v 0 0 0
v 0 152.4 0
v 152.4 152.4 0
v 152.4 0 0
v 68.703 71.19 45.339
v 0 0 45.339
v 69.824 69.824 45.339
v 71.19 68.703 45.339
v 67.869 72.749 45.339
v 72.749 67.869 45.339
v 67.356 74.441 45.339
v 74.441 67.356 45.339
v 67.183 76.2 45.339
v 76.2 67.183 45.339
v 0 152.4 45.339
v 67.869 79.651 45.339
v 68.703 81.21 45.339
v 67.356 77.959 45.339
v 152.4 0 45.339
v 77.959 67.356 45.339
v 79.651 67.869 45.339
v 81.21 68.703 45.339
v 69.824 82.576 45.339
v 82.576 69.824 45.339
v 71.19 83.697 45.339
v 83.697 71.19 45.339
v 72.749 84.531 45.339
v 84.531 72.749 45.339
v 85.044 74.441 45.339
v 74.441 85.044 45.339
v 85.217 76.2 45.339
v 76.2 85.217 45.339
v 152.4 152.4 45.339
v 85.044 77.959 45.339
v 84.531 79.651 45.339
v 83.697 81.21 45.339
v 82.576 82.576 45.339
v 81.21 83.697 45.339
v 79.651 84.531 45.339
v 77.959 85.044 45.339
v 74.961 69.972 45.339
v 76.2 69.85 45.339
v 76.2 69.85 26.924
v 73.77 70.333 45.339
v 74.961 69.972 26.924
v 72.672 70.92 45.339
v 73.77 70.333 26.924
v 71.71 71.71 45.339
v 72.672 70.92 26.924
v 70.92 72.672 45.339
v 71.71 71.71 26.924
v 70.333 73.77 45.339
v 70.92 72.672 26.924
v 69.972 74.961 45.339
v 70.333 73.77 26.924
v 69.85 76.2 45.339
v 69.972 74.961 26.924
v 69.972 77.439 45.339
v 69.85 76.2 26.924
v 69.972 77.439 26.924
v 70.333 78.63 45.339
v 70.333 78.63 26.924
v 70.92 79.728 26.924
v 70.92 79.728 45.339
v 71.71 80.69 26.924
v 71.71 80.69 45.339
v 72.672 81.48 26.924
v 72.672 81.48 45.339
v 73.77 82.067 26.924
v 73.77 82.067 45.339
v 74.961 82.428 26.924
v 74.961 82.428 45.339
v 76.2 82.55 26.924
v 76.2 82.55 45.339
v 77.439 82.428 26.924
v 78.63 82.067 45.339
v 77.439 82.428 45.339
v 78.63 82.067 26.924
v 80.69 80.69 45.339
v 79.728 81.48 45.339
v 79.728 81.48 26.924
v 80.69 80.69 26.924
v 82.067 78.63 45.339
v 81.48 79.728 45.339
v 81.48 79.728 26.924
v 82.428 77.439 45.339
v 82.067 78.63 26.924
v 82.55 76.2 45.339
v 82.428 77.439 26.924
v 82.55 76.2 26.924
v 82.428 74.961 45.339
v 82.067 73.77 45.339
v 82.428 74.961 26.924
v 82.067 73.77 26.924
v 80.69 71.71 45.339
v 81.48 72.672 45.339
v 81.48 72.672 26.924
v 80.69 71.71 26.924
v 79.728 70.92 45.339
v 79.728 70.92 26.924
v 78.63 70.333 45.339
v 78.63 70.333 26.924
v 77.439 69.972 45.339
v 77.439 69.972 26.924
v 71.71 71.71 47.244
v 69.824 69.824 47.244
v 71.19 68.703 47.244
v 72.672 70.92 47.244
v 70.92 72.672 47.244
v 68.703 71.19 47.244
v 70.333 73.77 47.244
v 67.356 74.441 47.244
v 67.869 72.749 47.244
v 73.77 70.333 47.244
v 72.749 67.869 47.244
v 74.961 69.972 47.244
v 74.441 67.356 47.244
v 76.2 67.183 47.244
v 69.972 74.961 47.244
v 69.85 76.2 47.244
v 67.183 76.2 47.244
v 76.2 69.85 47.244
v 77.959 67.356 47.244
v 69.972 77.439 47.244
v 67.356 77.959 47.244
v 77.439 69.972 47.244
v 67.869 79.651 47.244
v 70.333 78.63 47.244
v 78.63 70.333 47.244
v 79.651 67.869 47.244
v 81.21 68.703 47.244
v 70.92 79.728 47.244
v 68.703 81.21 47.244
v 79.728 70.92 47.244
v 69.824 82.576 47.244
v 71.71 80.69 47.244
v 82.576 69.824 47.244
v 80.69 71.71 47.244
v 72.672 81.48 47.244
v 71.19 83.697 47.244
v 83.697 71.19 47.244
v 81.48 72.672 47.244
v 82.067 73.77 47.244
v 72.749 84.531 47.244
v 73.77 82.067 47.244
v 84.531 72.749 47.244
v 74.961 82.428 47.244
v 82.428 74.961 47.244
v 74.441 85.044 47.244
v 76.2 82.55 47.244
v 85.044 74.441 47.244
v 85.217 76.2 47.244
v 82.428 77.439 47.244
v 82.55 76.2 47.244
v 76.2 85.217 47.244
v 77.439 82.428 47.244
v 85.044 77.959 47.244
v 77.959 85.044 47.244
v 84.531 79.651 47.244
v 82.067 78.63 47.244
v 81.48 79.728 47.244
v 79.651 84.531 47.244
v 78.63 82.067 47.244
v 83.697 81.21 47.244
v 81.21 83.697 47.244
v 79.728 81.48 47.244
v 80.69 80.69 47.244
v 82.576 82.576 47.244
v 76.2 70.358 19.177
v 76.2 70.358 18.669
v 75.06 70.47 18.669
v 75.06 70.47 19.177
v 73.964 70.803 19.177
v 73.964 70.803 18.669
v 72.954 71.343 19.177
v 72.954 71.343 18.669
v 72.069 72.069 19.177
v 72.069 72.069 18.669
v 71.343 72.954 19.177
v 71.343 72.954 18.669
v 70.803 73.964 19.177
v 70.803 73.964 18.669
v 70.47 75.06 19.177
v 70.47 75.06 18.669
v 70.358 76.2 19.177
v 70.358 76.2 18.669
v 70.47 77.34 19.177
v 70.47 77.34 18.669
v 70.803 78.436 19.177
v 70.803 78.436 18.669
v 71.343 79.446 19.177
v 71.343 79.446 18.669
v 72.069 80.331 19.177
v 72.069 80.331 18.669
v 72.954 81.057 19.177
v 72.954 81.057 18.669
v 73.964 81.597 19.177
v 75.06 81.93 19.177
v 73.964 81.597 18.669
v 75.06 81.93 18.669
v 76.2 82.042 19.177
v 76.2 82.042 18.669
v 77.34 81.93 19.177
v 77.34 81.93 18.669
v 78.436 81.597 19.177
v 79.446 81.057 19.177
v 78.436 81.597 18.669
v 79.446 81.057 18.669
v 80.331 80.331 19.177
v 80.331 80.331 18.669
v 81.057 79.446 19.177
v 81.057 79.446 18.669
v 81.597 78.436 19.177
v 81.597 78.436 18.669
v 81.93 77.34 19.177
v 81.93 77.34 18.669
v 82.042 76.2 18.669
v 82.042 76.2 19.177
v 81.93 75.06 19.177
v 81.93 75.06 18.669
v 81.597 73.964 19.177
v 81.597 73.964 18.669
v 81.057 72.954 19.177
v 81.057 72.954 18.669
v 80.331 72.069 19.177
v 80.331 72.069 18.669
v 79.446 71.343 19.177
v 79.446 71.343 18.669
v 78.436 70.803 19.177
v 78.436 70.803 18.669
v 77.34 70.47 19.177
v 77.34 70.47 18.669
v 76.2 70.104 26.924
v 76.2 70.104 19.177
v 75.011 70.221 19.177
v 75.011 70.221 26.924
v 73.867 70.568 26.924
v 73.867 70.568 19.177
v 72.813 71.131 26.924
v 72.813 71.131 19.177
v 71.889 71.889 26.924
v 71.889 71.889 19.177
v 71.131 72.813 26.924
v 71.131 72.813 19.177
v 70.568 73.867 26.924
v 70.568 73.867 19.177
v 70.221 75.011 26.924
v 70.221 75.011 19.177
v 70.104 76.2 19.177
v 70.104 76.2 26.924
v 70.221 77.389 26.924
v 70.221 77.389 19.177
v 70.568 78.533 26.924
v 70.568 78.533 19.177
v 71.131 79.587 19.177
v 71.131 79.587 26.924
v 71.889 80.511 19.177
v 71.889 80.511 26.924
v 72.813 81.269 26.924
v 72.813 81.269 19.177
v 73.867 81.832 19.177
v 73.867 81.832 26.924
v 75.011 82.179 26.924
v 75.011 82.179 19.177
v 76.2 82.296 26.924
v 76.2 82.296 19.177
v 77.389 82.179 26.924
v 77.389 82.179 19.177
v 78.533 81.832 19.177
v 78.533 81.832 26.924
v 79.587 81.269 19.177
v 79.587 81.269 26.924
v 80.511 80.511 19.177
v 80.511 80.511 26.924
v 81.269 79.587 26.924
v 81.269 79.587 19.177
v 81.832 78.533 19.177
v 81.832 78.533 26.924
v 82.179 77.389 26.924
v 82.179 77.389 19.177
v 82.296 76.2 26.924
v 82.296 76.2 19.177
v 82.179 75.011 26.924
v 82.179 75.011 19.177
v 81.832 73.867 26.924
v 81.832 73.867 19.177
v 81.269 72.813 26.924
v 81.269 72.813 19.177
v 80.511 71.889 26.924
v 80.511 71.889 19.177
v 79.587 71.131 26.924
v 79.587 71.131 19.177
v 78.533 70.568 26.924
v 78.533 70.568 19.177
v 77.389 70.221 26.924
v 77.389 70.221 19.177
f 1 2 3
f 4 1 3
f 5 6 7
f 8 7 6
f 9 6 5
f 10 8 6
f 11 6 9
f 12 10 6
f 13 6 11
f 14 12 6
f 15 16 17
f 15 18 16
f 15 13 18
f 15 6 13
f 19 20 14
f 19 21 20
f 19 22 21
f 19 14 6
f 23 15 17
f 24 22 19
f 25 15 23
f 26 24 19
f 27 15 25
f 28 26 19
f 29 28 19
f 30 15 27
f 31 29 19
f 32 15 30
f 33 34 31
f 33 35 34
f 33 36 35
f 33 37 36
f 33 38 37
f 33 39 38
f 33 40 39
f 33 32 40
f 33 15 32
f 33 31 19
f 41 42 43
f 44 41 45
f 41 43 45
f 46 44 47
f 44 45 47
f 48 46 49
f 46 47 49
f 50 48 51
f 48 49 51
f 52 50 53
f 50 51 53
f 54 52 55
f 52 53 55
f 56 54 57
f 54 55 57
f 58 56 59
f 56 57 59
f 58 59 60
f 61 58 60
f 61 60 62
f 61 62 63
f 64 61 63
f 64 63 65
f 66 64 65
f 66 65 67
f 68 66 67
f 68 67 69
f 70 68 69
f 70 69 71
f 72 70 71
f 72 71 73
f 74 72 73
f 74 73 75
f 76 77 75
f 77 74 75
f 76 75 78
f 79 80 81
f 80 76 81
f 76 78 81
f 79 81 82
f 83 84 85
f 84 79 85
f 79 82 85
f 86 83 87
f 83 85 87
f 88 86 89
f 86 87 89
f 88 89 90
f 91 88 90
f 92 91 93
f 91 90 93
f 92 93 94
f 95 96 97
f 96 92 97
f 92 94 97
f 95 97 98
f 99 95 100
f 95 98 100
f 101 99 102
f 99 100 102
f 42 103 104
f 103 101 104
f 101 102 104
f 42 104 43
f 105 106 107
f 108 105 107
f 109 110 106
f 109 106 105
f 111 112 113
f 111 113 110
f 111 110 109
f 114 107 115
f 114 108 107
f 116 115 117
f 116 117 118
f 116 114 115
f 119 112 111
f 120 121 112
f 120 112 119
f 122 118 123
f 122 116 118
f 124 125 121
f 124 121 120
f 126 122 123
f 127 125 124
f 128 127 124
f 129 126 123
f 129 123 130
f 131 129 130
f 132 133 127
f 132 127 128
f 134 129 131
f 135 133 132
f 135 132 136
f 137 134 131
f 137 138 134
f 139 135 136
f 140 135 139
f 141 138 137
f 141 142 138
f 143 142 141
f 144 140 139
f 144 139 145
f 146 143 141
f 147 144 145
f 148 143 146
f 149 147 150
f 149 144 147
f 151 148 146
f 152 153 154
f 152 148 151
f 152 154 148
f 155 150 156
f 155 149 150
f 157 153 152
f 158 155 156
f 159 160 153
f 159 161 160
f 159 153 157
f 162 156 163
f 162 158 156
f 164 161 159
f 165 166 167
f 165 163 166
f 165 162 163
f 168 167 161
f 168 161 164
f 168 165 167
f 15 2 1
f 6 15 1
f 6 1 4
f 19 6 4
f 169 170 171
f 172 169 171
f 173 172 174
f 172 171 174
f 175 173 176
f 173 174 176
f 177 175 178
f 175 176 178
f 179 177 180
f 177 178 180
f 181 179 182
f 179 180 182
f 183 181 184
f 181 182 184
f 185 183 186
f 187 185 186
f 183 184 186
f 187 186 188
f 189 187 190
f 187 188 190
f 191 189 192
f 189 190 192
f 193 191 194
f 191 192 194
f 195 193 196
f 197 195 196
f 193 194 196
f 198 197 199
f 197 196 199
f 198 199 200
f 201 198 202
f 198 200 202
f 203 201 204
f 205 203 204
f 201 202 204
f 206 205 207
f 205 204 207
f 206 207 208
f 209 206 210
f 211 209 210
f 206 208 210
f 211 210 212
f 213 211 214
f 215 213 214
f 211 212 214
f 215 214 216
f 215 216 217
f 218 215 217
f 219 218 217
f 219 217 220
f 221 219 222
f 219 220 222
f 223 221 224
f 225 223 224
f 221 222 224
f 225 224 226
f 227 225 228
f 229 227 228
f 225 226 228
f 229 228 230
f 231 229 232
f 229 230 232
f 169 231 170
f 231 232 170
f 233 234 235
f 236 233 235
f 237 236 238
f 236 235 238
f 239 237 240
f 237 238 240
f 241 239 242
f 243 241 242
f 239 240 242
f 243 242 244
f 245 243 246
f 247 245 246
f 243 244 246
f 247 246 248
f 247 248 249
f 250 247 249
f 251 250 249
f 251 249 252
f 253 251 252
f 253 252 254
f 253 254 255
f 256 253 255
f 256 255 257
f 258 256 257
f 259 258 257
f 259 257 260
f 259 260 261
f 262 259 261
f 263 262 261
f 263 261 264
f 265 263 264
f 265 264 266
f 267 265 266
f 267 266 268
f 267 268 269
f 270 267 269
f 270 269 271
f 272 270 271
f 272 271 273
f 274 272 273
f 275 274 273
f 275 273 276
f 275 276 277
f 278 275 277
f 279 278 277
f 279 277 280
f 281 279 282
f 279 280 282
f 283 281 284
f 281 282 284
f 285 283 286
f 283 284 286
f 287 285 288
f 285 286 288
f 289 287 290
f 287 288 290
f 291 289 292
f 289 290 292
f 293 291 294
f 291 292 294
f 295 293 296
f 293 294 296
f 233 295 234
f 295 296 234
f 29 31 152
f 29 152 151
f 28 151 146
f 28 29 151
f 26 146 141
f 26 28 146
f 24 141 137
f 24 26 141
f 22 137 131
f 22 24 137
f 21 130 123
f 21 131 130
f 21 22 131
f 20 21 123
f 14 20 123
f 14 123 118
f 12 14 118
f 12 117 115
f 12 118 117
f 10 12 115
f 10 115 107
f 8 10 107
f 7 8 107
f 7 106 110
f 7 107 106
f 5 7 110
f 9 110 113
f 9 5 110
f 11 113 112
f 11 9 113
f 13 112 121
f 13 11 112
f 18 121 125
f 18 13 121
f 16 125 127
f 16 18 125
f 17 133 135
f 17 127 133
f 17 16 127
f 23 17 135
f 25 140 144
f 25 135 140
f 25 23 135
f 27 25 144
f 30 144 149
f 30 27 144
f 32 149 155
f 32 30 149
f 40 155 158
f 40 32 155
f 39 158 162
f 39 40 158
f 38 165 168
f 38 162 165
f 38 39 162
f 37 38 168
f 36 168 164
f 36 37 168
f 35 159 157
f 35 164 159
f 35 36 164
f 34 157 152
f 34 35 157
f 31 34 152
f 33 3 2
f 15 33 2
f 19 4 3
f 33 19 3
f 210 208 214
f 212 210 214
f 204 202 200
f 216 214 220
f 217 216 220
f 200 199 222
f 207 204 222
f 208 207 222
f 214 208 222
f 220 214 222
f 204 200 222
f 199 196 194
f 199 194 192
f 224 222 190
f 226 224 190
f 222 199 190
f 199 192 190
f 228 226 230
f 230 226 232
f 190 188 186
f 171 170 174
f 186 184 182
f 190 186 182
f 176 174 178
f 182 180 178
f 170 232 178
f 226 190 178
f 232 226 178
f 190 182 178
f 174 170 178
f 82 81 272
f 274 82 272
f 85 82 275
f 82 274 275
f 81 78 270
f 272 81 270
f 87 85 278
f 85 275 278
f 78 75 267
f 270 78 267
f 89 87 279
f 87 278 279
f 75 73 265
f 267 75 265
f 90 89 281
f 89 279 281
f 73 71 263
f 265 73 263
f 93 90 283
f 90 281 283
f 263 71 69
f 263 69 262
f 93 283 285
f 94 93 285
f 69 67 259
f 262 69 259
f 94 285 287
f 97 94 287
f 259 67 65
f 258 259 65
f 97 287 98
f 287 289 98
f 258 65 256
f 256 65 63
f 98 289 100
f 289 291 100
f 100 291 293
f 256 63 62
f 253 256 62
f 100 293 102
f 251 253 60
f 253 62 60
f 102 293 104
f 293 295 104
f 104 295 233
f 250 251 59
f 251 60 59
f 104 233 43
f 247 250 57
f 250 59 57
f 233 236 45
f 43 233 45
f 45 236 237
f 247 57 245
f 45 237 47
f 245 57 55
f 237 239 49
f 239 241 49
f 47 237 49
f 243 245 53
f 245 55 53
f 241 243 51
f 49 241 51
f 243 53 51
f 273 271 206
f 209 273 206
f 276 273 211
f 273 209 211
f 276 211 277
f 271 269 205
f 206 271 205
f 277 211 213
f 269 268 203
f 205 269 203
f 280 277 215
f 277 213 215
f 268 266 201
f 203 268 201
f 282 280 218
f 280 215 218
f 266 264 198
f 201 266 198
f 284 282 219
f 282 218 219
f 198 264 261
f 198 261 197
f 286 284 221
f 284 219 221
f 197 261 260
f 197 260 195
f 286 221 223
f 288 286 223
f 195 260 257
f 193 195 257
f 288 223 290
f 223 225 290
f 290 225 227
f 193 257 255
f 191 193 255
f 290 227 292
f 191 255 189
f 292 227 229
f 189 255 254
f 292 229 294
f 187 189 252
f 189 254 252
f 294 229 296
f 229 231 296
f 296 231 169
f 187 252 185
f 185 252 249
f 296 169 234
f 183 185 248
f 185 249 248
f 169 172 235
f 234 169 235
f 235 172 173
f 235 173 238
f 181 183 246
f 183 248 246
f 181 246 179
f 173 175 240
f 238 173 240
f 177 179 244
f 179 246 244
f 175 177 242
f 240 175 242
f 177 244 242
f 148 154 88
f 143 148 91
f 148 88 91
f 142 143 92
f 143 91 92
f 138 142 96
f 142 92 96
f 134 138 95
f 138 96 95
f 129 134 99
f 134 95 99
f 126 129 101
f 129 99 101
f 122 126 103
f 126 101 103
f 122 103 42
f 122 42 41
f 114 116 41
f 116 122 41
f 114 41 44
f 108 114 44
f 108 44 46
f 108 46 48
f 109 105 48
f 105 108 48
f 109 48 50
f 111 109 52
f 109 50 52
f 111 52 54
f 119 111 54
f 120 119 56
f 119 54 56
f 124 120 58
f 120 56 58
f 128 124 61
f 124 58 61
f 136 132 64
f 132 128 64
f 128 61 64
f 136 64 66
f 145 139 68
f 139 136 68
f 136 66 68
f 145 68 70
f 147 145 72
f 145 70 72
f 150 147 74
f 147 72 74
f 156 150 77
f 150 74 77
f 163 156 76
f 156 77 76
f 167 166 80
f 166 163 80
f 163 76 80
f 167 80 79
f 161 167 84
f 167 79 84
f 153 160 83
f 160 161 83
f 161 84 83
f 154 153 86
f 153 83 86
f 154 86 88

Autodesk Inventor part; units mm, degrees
ref_plane "YZ Plane" through (0, 0, 0) normal (1, 0, 0) x (0, 1, 0)
ref_plane "XZ Plane" through (0, 0, 0) normal (0, 1, 0) x (-1, 0, 0)
ref_plane "XY Plane" through (0, 0, 0) normal (0, 0, 1) x (1, 0, 0)
sketch "Sketch1" plane through (0, 0, 0) normal (0, 0, 1) x (1, 0, 0)
  line L0 (0, 0) -> (152.4, 0)
  line L1 (152.4, 0) -> (152.4, 152.4)
  line L2 (152.4, 152.4) -> (0, 152.4)
  line L3 (0, 152.4) -> (0, 0)
  dimension "d0" = 152.4
  dimension "d1" = 152.4
extrude "Extrusion1" add sketch "Sketch1" along normal blind 45.339
sketch "Sketch2" plane through (0, 0, 45.339) normal (0, 0, 1) x (1, 0, 0)
  line L0 (0, 0) -> (152.4, 0) projected
  line L1 (0, 152.4) -> (0, 0) projected
  circle A0 centre (76.2, 76.2) radius 6.35
  circle A1 centre (76.2, 76.2) radius 9.017
  dimension "d13" = 12.7
  dimension "d14" = 18.034
  dimension "d15" = 76.2
  dimension "d16" = 76.2
extrude "Extrusion2" add sketch "Sketch2" along normal blind 1.905
hole "Hole2" at (76.2, 76.2, 45.339) direction (0, 0, -1) diameter 12.7 depth 18.415
hole "Hole3" at (76.2, 76.2, 26.924) direction (0, 0, -1) diameter 12.192 depth 7.747
hole "Hole4" at (76.2, 76.2, 19.177) direction (0, 0, -1) diameter 11.684 depth 0.508
properties part number "Door"
